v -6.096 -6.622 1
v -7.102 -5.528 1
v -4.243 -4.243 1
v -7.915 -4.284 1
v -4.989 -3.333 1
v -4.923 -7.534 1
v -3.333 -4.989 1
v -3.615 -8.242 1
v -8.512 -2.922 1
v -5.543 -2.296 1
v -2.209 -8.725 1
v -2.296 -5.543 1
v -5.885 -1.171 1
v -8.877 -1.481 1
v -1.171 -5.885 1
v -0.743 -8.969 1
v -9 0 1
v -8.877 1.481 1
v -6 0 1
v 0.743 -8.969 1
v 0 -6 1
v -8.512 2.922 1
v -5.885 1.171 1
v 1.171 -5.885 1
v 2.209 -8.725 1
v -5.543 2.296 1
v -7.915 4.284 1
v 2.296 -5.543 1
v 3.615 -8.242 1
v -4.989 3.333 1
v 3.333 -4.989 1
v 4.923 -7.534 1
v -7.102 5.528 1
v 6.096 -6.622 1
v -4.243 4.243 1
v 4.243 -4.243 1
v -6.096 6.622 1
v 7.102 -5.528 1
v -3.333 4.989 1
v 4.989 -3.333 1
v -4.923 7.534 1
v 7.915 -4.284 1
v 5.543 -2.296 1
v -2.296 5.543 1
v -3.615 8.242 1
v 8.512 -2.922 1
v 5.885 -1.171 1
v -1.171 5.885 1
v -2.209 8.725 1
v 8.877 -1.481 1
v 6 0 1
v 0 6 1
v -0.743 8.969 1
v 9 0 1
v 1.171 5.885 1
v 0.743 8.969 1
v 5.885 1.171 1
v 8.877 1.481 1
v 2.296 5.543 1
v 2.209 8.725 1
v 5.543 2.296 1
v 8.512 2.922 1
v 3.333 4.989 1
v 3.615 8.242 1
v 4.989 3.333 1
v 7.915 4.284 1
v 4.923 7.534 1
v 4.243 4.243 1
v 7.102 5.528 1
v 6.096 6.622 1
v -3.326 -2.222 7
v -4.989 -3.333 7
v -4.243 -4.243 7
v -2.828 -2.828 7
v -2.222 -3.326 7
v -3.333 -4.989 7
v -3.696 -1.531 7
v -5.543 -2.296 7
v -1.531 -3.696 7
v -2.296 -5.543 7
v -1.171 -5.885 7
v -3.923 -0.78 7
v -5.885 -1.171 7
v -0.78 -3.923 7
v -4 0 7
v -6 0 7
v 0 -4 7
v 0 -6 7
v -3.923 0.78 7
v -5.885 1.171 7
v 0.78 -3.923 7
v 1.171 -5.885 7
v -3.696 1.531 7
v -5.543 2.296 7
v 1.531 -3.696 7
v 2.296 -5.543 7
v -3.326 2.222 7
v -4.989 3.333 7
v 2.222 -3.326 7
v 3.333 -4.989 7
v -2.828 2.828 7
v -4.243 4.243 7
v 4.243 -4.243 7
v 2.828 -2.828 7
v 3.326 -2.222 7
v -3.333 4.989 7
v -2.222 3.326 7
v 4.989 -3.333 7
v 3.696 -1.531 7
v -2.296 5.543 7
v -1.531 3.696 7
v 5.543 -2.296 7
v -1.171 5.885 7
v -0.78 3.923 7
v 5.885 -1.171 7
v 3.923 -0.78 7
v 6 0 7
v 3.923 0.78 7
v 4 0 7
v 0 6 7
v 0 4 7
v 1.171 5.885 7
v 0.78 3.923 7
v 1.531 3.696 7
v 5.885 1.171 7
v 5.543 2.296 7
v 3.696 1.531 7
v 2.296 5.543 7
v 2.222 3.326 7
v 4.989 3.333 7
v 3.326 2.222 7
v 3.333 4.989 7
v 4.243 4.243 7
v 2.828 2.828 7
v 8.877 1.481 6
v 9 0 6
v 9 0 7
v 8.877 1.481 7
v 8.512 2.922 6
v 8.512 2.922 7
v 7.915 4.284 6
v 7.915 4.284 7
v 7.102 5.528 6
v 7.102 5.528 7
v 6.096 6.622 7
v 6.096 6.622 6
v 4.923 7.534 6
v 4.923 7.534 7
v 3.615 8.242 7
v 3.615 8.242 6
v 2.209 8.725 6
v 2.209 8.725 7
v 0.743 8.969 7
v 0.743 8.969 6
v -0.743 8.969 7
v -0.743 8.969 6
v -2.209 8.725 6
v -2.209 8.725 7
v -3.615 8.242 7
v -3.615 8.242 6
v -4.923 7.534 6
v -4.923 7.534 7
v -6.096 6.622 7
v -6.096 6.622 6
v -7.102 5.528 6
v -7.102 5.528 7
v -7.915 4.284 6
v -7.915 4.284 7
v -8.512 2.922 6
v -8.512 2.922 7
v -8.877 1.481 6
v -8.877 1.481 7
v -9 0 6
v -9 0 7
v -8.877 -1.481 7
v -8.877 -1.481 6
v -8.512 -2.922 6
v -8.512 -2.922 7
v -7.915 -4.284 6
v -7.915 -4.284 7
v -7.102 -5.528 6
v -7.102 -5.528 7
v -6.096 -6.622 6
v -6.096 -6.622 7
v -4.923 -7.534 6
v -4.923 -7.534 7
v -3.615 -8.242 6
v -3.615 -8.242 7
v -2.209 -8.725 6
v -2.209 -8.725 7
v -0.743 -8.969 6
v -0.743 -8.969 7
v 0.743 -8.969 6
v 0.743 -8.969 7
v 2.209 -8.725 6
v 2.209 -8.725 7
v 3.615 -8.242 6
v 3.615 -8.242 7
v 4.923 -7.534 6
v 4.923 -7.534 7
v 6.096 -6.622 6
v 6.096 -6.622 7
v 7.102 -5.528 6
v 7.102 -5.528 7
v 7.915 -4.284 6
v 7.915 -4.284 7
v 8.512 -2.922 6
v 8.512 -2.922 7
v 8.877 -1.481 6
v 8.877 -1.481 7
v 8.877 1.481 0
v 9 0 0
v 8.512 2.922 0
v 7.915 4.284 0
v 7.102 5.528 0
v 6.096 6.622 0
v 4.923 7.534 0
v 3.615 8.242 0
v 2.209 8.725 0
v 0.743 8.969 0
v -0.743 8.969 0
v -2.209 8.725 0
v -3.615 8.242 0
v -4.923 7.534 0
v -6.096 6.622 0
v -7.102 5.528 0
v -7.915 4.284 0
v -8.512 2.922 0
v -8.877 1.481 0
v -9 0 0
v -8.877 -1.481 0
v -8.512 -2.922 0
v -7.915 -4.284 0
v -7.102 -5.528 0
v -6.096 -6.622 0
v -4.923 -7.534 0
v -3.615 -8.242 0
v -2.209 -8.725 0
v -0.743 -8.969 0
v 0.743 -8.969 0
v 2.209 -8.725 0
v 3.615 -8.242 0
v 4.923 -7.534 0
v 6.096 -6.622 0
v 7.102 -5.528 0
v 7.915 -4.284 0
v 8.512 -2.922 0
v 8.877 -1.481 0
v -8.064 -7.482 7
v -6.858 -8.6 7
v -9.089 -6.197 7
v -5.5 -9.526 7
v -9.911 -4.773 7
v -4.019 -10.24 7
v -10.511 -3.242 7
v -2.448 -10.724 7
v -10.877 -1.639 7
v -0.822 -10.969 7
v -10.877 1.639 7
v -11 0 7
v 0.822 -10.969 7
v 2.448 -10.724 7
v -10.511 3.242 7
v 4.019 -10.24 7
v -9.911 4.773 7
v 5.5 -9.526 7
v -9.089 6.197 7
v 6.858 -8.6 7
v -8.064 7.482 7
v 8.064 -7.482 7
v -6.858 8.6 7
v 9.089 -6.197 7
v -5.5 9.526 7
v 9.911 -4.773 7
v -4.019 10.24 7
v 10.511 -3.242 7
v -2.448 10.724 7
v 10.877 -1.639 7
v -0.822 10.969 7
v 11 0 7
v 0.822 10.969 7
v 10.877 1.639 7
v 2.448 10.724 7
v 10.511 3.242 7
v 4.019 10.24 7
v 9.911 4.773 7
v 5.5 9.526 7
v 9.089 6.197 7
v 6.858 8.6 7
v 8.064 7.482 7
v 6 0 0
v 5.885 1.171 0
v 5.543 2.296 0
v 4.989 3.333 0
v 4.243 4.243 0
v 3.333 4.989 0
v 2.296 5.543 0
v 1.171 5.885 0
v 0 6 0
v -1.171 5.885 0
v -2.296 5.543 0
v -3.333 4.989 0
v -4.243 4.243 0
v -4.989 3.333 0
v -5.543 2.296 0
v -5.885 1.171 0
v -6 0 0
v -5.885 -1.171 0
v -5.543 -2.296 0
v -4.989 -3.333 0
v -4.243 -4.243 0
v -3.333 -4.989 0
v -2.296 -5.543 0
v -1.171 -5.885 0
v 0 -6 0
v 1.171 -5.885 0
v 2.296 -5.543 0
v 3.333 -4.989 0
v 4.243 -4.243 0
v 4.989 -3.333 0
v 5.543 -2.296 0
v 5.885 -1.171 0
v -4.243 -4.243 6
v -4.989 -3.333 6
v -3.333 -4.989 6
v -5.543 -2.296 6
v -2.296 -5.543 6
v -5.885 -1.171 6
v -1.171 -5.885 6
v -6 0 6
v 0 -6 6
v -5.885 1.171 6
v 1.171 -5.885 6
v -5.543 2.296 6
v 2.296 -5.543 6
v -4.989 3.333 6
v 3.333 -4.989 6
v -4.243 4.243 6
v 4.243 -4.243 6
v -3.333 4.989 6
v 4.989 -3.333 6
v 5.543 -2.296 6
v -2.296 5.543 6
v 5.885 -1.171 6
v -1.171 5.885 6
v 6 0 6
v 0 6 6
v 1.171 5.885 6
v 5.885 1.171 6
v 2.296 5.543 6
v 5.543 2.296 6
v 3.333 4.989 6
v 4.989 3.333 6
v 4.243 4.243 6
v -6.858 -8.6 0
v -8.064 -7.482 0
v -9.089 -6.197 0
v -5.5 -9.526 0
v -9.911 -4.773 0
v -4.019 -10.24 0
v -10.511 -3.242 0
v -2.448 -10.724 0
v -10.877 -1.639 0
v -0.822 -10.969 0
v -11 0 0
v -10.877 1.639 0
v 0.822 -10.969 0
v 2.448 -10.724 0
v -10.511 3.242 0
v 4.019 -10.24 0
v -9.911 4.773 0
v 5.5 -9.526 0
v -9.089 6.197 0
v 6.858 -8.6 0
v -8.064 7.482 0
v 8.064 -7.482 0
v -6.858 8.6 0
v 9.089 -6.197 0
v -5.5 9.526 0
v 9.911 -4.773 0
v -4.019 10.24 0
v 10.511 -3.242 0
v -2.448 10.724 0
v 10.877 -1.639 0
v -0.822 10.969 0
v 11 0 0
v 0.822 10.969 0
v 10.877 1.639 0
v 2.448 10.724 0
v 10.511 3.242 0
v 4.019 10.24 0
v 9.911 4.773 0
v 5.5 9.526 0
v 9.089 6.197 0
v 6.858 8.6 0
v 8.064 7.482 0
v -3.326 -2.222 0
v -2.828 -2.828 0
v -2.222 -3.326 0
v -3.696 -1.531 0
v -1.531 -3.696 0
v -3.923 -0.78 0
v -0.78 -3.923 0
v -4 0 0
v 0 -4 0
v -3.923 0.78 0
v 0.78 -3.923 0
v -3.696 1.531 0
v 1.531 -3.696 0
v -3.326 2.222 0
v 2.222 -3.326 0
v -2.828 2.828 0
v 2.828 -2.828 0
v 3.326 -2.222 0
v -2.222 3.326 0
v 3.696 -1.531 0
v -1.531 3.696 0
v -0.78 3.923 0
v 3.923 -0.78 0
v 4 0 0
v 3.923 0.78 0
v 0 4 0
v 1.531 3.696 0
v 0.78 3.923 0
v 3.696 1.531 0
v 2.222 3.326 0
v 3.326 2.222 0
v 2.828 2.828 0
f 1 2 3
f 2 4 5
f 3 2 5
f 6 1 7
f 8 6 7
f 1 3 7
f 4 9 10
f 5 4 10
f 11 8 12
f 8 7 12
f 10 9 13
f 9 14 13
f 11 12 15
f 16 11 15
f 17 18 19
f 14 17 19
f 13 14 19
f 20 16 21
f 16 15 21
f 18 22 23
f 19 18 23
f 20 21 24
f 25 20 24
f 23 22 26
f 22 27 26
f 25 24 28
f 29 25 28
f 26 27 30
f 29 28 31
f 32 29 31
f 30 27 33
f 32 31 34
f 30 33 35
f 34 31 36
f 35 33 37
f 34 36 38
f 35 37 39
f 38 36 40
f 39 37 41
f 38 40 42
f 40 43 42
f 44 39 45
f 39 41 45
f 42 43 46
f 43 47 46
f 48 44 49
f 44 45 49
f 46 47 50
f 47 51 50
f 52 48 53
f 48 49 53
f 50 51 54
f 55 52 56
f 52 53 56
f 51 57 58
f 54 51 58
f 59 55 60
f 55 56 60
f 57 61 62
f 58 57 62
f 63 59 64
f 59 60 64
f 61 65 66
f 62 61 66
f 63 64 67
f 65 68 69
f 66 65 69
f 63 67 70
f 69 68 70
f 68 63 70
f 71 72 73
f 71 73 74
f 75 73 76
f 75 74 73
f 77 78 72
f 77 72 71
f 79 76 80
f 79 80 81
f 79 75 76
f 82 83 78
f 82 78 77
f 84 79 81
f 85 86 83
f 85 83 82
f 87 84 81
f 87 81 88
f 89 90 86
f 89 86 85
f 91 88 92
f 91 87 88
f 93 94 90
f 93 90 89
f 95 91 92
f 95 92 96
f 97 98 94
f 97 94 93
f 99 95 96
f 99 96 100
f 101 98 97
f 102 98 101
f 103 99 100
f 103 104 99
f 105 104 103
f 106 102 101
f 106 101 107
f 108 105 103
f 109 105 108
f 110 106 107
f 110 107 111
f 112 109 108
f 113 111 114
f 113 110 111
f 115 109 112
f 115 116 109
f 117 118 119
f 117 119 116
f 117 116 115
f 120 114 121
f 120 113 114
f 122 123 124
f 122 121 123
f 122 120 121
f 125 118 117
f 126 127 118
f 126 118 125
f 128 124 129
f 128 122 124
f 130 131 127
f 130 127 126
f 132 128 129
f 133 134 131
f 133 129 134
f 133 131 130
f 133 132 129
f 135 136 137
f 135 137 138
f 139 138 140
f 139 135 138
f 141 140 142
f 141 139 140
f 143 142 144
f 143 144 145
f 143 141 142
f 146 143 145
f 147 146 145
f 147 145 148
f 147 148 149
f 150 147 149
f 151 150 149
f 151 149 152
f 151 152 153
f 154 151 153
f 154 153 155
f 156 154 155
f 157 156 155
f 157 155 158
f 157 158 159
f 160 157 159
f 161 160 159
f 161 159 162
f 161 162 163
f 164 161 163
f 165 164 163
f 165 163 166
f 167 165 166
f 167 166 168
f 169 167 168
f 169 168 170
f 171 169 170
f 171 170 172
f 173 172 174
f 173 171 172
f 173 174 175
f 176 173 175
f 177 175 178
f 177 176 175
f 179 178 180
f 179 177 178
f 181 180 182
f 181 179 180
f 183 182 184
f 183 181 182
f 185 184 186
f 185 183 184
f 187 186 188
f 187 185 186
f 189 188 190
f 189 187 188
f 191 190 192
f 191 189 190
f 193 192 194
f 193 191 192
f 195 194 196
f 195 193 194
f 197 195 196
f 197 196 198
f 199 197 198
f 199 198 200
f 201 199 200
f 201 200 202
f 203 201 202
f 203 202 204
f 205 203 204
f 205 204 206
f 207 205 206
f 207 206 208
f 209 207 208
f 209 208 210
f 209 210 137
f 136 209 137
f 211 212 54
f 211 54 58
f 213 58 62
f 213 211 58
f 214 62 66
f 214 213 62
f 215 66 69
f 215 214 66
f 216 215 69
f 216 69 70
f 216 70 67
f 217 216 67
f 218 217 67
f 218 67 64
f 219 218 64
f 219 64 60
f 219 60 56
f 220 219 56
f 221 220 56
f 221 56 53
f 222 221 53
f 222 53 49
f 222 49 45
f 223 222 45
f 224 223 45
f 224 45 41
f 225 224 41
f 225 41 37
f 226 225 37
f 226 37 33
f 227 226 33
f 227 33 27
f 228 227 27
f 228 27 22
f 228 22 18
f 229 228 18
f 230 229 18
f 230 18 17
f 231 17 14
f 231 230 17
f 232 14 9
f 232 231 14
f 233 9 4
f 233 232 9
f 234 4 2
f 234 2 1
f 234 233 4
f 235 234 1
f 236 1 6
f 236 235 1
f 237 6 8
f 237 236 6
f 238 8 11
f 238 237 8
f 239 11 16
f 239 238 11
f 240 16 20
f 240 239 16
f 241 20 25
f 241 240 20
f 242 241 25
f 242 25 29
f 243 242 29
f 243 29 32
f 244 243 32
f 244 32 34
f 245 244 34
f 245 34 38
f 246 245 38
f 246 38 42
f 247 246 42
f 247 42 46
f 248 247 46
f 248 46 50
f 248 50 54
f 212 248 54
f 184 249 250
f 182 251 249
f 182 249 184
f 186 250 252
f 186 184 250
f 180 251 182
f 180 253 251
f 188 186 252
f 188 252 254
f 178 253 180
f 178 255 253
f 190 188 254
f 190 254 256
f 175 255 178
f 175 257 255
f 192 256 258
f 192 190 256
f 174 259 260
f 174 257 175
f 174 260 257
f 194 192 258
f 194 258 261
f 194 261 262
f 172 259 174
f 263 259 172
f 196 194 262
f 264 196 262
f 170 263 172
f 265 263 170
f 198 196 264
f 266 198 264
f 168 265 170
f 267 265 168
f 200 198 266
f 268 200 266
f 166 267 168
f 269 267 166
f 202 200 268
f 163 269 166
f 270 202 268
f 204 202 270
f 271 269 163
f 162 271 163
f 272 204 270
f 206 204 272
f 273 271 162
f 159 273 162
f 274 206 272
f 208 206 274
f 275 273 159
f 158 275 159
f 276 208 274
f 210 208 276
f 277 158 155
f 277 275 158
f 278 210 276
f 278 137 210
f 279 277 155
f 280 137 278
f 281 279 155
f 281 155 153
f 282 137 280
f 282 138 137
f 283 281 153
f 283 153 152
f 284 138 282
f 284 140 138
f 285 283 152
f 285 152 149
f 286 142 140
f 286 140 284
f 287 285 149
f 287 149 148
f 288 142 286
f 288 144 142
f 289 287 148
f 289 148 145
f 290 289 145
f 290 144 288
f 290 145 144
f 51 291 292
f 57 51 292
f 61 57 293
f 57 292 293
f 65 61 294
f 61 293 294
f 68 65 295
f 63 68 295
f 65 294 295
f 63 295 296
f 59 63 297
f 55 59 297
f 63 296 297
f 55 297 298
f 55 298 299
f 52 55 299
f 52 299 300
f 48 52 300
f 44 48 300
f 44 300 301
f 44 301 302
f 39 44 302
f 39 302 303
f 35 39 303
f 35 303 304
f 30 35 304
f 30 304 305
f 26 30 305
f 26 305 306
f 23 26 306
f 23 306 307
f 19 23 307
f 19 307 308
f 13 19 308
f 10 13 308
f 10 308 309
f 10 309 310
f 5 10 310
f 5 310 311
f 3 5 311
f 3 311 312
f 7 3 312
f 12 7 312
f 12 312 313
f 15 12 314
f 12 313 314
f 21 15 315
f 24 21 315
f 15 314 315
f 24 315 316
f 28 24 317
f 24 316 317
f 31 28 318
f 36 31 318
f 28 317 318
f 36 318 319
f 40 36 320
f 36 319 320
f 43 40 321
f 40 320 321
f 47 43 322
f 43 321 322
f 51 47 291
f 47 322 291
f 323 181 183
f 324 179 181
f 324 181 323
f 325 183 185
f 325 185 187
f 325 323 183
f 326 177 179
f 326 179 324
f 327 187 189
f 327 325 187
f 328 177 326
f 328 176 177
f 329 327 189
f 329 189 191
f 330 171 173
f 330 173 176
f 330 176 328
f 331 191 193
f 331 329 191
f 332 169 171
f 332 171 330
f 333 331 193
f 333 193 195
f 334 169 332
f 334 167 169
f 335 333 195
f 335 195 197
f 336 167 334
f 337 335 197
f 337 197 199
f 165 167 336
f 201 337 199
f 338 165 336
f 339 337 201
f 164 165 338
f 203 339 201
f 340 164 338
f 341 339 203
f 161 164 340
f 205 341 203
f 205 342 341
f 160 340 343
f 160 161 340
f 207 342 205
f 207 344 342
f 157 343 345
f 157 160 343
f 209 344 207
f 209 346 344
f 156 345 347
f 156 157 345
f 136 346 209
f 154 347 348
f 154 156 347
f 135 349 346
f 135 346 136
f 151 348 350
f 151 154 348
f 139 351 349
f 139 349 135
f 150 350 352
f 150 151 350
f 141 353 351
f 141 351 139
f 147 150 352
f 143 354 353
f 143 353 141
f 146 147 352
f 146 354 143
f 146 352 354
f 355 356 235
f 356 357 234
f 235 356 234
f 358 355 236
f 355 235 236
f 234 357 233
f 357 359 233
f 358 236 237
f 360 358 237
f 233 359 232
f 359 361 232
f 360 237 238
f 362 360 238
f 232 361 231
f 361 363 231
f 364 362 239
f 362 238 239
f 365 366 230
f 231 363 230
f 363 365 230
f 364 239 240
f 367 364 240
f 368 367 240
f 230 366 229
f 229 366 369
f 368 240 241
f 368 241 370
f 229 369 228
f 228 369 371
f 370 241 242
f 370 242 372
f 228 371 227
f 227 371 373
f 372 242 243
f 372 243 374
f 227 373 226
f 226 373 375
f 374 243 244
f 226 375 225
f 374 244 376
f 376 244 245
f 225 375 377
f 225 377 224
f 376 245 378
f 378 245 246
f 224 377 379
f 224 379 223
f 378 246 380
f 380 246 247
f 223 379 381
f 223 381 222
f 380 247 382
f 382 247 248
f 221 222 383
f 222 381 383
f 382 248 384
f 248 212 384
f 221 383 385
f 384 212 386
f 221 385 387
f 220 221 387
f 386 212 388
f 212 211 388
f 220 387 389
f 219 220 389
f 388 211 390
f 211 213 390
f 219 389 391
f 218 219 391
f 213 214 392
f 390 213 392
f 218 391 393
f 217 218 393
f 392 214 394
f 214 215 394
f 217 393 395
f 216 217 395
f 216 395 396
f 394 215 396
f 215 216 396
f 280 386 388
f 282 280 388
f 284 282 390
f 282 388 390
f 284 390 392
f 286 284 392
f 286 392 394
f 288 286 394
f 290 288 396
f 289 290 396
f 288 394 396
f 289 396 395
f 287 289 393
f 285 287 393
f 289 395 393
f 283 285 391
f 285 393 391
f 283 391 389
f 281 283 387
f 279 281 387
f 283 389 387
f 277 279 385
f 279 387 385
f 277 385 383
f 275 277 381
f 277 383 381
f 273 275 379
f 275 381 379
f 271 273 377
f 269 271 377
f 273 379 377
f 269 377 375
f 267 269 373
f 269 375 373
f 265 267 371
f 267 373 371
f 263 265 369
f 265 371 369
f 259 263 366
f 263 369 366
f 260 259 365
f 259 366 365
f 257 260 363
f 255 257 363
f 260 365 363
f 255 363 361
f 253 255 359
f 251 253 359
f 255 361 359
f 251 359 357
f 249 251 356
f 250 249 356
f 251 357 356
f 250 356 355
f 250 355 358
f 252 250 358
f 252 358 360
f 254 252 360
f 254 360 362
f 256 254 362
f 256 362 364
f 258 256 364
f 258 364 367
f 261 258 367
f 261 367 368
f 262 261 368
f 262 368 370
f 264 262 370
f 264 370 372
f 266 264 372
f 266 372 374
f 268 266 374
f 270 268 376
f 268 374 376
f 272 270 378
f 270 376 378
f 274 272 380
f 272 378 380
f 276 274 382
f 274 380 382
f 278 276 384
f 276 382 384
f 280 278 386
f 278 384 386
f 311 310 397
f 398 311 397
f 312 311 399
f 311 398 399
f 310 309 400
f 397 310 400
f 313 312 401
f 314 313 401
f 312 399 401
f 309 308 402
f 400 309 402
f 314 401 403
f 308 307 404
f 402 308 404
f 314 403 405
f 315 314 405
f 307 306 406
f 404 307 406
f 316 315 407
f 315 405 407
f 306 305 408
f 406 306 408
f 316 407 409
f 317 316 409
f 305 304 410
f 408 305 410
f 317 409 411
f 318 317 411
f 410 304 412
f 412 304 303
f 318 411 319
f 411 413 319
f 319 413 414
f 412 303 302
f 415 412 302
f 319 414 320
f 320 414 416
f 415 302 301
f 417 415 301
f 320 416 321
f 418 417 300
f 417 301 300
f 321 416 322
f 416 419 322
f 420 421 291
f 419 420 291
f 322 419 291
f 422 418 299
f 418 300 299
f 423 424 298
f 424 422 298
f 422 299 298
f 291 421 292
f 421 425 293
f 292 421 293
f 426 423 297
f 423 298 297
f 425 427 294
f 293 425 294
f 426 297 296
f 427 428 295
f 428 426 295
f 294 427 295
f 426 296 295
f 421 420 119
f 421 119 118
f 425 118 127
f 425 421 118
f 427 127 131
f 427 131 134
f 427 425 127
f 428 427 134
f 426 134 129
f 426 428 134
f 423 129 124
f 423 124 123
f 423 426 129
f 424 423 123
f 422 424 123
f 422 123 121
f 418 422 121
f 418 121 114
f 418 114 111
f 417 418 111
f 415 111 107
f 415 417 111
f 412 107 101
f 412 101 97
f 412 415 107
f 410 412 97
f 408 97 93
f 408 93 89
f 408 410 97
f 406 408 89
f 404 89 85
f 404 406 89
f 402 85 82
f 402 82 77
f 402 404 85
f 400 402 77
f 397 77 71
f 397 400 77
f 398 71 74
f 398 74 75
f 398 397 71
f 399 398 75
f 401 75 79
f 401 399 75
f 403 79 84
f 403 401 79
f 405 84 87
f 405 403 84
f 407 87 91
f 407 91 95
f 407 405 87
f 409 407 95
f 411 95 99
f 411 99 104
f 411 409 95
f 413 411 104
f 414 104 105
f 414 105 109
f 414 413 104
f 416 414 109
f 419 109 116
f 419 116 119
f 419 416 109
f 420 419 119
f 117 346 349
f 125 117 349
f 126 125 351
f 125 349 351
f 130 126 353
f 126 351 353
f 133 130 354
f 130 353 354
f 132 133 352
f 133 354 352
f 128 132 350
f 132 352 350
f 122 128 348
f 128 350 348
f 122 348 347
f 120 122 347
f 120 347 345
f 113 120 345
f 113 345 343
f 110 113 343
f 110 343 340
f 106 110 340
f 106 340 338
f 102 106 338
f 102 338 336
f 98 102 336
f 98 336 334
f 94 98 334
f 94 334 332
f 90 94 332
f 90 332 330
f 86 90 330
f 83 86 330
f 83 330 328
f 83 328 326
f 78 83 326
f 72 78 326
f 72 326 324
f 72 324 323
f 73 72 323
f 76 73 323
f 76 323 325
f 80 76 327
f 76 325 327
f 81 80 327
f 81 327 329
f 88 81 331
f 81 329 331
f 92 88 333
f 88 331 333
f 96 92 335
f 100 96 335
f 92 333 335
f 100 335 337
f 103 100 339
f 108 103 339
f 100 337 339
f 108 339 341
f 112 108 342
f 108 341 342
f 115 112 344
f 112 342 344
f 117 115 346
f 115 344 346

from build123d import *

# Parameters (mm, degrees)
F0_R     = 11
F0_R_2   = 9
F1_DEPTH = 7
F0_R_3   = 6
F0_R_4   = 4
F2_START = 1
F2_DEPTH = 5


with BuildPart() as f1:
    # F0 (on Top) → F1 (new body)
    with BuildSketch(Plane.XY):
        Circle(F0_R)
        Circle(F0_R_2, mode=Mode.SUBTRACT)
    extrude(amount=F1_DEPTH)



with BuildPart() as f1b:
    # F0 (on Top) → F1, piece 2 (new body)
    with BuildSketch(Plane.XY):
        Circle(F0_R_3)
        Circle(F0_R_4, mode=Mode.SUBTRACT)
    extrude(amount=F1_DEPTH)


with BuildPart() as f1_1:
    add(f1.part)

    add(f1b.part)  # F2 merges F1b
    # F0 (on Top) → F2 (join)
    with BuildSketch(Plane.XY.offset(F2_START)):
        Circle(F0_R_2)
        Circle(F0_R_3, mode=Mode.SUBTRACT)
    extrude(amount=F2_DEPTH)


solid = f1_1.part
